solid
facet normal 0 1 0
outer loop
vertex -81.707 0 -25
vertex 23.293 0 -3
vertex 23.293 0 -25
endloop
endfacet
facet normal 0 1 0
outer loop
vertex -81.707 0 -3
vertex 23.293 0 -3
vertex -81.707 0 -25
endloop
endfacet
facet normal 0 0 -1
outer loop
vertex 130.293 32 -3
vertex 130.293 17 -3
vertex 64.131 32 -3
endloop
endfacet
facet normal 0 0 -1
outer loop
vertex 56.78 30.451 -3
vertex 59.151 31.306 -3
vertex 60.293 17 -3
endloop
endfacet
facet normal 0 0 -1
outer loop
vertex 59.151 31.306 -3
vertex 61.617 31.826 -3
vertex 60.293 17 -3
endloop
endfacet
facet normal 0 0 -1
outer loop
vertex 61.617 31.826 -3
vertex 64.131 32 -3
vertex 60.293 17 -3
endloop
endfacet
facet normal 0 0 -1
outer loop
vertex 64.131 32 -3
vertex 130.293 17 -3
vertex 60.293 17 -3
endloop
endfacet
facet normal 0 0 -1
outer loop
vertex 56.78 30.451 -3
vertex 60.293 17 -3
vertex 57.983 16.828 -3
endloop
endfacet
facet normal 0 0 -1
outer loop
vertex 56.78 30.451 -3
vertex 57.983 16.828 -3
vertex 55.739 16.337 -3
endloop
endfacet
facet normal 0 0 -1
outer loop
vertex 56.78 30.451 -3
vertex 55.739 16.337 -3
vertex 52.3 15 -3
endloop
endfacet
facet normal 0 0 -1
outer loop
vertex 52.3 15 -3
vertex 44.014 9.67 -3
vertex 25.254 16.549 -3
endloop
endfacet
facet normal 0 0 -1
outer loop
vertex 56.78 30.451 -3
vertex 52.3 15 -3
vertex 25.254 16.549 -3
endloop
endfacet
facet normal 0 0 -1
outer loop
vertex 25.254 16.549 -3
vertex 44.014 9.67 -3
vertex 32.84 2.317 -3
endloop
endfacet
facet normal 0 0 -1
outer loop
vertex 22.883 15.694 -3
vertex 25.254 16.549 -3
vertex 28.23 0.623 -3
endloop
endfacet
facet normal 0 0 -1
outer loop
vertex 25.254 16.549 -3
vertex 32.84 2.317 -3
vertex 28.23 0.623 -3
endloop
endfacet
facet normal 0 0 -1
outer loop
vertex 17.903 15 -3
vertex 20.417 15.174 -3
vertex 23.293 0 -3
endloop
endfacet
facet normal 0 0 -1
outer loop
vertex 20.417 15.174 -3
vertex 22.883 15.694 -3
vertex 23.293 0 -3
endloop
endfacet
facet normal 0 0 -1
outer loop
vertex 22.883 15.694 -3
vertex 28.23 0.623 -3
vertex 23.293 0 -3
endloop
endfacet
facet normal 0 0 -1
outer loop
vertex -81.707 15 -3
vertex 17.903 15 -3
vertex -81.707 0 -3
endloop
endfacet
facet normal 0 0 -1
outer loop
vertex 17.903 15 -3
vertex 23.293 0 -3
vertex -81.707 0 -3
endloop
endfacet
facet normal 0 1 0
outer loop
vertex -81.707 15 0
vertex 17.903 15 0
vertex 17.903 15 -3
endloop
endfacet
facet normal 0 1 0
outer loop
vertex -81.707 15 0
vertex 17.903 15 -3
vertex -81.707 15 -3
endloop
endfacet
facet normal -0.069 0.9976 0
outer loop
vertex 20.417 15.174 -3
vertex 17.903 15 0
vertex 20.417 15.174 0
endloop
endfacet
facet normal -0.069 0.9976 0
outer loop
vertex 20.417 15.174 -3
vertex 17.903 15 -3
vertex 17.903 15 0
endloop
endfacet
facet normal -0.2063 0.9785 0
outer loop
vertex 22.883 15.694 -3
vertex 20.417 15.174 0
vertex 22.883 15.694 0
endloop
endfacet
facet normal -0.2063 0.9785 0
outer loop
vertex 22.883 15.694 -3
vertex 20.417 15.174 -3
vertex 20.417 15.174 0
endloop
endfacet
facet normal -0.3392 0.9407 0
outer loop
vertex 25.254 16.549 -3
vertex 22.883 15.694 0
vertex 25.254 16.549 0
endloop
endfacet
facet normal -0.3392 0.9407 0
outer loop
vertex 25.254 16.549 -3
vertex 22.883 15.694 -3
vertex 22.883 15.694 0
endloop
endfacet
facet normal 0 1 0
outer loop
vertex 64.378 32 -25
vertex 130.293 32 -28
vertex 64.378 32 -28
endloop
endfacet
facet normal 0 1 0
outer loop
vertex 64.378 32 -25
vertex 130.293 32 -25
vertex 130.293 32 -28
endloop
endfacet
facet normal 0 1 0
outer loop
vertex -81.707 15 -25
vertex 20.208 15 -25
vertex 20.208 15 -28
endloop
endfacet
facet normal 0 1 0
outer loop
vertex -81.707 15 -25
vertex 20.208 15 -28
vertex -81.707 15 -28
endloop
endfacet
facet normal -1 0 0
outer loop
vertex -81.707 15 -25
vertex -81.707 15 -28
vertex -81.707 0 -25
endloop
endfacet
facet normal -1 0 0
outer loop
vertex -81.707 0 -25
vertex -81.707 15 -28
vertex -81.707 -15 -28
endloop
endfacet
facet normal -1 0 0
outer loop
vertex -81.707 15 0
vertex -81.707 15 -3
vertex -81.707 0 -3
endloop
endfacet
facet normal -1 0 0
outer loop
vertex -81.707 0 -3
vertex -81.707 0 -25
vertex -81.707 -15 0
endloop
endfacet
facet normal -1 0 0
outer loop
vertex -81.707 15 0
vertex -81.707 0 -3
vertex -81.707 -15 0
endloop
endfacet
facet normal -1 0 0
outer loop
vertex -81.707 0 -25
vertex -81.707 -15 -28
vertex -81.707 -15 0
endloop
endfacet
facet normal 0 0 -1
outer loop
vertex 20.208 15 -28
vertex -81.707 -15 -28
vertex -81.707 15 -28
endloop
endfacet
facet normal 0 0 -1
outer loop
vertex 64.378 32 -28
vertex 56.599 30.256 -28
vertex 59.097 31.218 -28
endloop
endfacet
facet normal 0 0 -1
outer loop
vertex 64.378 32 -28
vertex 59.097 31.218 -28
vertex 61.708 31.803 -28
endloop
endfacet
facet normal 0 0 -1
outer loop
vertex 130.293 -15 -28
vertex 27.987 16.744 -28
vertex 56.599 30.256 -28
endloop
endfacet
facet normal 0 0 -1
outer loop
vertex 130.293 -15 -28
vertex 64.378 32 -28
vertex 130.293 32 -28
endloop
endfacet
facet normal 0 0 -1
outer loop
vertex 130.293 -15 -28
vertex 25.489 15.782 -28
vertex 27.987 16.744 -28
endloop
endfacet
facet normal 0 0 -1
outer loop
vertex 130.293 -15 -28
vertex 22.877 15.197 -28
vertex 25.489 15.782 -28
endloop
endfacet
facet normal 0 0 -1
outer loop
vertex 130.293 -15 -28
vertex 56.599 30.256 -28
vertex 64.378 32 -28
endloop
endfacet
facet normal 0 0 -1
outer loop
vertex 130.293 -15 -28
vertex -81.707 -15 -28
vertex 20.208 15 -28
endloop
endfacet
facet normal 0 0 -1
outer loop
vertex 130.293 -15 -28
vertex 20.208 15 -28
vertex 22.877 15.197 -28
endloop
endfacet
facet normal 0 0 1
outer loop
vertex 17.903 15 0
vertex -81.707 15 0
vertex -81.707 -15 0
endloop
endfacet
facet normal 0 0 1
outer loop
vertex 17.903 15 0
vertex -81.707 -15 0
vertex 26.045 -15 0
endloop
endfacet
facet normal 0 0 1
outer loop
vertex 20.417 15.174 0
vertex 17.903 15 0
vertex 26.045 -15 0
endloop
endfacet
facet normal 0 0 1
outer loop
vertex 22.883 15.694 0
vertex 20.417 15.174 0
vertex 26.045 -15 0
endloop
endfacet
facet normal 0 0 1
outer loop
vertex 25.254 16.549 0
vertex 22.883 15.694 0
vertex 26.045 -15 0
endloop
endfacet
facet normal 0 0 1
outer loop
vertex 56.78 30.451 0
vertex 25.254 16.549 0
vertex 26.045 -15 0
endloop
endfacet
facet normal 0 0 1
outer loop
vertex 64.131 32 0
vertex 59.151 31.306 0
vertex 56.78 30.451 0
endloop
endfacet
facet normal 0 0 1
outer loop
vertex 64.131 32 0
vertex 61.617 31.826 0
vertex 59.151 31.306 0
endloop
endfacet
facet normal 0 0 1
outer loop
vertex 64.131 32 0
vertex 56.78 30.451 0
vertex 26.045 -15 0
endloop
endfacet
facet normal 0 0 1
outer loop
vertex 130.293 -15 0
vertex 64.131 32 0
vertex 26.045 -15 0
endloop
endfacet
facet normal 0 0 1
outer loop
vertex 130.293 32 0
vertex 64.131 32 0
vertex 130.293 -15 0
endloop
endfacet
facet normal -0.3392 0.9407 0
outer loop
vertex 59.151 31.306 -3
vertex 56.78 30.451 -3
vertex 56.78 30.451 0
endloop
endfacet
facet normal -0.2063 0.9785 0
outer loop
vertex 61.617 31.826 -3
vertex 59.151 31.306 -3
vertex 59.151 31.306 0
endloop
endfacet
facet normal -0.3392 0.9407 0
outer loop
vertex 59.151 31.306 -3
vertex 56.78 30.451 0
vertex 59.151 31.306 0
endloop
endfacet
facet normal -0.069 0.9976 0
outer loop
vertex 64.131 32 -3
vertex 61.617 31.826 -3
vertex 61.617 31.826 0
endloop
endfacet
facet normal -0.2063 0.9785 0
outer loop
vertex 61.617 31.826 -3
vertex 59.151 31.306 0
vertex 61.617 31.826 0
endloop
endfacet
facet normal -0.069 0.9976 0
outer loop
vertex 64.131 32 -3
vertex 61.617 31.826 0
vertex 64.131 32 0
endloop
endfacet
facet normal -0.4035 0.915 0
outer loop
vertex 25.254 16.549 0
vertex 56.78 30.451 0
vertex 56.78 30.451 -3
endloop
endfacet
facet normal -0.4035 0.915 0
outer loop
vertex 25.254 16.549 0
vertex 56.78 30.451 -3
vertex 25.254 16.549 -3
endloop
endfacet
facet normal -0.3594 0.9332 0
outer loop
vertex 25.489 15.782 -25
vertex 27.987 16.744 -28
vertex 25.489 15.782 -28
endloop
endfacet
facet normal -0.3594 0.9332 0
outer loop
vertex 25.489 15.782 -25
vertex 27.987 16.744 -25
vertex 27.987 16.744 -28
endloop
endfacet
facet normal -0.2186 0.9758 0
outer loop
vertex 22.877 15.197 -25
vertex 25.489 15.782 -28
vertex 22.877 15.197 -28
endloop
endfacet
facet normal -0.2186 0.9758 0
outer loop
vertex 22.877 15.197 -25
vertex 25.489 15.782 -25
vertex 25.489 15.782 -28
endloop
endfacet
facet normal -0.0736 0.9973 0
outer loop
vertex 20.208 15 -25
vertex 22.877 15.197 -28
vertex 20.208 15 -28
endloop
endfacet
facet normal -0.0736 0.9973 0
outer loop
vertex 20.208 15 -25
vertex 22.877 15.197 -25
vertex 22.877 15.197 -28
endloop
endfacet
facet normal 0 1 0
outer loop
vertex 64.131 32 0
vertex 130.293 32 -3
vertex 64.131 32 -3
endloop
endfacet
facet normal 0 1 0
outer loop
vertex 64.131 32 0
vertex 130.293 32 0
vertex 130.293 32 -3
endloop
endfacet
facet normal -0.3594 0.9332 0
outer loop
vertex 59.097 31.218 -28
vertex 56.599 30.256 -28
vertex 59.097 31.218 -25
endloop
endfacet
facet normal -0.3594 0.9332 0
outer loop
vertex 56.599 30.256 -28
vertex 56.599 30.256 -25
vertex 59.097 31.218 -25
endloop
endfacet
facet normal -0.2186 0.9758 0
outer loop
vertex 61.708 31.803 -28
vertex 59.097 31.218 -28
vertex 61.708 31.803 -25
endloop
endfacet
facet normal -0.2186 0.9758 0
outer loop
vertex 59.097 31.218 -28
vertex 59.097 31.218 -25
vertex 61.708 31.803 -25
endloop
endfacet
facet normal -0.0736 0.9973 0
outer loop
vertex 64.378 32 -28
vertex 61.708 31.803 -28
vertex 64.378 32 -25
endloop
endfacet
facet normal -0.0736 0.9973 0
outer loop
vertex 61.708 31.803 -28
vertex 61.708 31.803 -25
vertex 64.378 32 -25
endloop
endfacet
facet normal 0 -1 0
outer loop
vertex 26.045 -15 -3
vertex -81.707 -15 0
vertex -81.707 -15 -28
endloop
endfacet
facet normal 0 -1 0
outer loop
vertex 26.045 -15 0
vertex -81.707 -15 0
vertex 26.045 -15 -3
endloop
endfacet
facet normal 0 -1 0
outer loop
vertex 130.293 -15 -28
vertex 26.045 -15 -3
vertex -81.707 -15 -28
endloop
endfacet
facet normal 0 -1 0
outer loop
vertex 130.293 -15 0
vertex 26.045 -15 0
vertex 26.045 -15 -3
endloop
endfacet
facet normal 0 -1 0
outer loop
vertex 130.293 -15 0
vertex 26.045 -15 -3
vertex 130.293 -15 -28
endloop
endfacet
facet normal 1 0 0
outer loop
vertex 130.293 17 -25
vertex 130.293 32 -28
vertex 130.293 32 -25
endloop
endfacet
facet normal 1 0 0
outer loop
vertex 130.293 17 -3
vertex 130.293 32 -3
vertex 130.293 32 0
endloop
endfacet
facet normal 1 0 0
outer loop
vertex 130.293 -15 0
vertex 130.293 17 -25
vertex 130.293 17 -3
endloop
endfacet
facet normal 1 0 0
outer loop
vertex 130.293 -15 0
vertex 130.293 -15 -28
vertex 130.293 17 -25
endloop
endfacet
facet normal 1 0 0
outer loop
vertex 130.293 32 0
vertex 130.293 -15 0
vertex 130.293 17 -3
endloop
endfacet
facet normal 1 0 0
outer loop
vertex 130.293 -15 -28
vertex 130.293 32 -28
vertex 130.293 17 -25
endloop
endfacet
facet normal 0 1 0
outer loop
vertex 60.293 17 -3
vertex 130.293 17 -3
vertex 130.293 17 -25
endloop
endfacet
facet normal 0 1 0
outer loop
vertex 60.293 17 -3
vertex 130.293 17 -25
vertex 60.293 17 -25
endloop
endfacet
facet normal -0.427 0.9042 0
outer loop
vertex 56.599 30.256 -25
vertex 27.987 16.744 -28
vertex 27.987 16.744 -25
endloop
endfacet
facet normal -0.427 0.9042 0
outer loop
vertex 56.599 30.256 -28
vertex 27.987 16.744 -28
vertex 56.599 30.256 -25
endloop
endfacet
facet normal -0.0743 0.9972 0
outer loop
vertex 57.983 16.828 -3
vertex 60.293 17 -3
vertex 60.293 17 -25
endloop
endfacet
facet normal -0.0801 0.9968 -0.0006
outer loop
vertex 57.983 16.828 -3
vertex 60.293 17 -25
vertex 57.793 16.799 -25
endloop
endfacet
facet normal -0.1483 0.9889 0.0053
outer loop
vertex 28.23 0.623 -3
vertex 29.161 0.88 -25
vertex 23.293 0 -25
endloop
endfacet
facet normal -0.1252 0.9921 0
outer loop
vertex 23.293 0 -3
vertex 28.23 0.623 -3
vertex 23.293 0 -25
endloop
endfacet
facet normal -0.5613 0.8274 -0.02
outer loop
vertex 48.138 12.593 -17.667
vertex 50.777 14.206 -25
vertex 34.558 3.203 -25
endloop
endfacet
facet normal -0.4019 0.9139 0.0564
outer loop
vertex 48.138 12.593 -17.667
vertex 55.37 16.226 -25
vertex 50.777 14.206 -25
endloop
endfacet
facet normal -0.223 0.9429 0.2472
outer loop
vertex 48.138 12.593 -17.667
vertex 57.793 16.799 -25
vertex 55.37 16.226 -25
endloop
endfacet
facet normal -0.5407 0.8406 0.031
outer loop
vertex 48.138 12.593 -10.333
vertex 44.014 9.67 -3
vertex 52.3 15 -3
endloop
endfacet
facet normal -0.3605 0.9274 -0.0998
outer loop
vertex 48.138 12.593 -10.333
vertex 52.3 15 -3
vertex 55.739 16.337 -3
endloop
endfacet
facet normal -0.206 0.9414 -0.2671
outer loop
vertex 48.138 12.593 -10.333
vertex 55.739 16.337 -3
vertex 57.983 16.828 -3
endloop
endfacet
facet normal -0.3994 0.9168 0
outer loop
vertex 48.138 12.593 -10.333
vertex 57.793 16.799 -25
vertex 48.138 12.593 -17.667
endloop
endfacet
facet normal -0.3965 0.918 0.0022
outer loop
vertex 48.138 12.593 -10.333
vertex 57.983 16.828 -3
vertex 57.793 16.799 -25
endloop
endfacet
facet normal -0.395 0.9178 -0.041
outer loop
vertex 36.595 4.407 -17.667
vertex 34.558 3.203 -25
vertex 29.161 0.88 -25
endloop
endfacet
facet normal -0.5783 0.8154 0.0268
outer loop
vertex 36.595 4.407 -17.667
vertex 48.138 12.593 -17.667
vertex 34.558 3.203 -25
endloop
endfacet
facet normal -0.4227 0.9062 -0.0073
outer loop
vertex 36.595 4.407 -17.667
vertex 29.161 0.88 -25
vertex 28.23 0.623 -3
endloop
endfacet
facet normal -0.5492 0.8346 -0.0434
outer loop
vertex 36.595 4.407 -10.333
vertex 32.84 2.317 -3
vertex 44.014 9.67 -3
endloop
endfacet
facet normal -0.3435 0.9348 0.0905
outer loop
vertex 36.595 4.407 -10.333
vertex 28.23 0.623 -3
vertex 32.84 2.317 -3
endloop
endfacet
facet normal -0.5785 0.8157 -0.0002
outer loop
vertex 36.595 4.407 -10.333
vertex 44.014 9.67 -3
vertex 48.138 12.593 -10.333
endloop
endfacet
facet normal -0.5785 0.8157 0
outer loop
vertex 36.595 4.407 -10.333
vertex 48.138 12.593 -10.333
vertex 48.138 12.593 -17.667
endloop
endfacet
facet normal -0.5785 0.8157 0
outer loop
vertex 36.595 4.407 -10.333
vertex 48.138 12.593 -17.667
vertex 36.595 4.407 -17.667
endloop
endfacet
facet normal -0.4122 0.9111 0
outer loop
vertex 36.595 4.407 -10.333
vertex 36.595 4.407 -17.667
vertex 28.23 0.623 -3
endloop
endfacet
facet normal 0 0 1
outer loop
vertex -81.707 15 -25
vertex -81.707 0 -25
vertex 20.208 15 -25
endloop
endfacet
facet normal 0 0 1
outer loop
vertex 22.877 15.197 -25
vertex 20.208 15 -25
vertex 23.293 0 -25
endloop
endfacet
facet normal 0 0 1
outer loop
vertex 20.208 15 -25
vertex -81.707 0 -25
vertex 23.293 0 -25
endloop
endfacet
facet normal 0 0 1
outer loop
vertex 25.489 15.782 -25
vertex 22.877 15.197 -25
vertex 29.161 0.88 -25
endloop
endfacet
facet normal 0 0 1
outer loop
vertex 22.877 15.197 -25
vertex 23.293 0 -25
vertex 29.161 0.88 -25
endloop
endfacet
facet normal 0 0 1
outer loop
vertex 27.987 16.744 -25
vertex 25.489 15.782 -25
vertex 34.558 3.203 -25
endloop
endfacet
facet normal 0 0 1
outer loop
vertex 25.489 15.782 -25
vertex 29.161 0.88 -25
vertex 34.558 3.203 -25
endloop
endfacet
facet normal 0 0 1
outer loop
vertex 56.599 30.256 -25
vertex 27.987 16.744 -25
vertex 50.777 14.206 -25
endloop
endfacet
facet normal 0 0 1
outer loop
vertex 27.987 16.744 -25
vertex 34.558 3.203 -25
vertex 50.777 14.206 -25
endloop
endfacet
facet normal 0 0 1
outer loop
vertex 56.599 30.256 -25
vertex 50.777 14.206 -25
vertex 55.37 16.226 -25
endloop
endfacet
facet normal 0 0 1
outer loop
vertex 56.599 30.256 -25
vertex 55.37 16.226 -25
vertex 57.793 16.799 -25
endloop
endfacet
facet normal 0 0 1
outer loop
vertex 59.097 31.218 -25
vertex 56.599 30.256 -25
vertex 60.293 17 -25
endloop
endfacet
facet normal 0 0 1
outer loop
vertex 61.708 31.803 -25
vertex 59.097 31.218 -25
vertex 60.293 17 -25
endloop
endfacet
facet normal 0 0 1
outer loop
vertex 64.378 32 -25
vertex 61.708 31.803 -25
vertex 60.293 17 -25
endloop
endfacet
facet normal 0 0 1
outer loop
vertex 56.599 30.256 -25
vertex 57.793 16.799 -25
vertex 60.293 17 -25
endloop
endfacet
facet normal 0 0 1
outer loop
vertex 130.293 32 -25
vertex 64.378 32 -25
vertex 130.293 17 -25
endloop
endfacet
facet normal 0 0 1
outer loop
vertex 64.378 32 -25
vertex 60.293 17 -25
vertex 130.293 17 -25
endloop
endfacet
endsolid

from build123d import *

# Parameters (mm, degrees)
F1_DEPTH  = 28
F2_W      = 211.909
F2_H      = 3
F3_DEPTH  = 15
F4_W      = 70
F4_H      = 3
F5_DEPTH  = 15
F7_DEPTH  = 3
F8_R      = 18.2181512029
F10_DEPTH = 3
F11_R     = 18.218


with BuildPart() as f1:
    # F0 (on Top) → F1 (new body)
    with BuildSketch(Plane.XY):
        with BuildLine():
            Line((23.2926856095, 0), (-81.7073143905, 0))
            Line((-81.7073143905, 0), (-81.7073143905, -15))
            Line((-81.7073143905, -15), (130.2926856095, -15))
            Line((130.2926856095, -15), (130.2926856095, 17))
            Line((130.2926856095, 17), (60.2926856095, 17))
            add(Edge.make_bspline(
                [(60.2926856095, 17), (47.0403235396, 17), (38.2657825675, 0), (23.2926856095, 0)],
                knots=[0, 0, 0, 0, 40.718546143, 40.718546143, 40.718546143, 40.718546143], degree=3))
        make_face()
    extrude(amount=-F1_DEPTH)

    # F2 (on face) → F3 (join)
    with BuildSketch(Plane(origin=(0, 0, 0), x_dir=(-1, 0, 0), z_dir=(0, 1, 0))):
        with Locations((-24.2471856095, -1.5)):
            Rectangle(F2_W, F2_H)
        with Locations((-24.2471856095, -26.5)):
            Rectangle(F2_W, F2_H)
    extrude(amount=F3_DEPTH)

    # F4 (on face) → F5 (join)
    with BuildSketch(Plane(origin=(0, 17, 0), x_dir=(-1, 0, 0), z_dir=(0, 1, 0))):
        with Locations((-95.2926856095, -26.5)):
            Rectangle(F4_W, F4_H)
        with Locations((-95.2926856095, -1.5)):
            Rectangle(F4_W, F4_H)
    extrude(amount=F5_DEPTH)

    # F6 (on face) → F7 (join)
    with BuildSketch(Plane.XY):
        Polygon((64.7905170918, 0), (60.2926856095, 32), (21.7418372631, 15), (26.0446537286, -15), align=None)
    extrude(amount=-F7_DEPTH)

    # F8
    f8_edges = [f1.edges().sort_by_distance(p)[0] for p in [
        (60.292686, 32, -1.5),
        (21.741837, 15, -1.5),
    ]]
    fillet(f8_edges, radius=F8_R)

    # F9 (on face) → F10 (join)
    with BuildSketch(Plane(origin=(0, 0, -28), x_dir=(1, 0, 0), z_dir=(0, 0, -1))):
        Polygon((24.2926856095, -15), (60.2926856095, -32), (60.2926856095, -17), (52.3001670697, -15), align=None)
    extrude(amount=-F10_DEPTH)

    # F11
    f11_edges = [f1.edges().sort_by_distance(p)[0] for p in [
        (60.292686, 32, -26.5),
        (24.292686, 15, -26.5),
    ]]
    fillet(f11_edges, radius=F11_R)


solid = f1.part
